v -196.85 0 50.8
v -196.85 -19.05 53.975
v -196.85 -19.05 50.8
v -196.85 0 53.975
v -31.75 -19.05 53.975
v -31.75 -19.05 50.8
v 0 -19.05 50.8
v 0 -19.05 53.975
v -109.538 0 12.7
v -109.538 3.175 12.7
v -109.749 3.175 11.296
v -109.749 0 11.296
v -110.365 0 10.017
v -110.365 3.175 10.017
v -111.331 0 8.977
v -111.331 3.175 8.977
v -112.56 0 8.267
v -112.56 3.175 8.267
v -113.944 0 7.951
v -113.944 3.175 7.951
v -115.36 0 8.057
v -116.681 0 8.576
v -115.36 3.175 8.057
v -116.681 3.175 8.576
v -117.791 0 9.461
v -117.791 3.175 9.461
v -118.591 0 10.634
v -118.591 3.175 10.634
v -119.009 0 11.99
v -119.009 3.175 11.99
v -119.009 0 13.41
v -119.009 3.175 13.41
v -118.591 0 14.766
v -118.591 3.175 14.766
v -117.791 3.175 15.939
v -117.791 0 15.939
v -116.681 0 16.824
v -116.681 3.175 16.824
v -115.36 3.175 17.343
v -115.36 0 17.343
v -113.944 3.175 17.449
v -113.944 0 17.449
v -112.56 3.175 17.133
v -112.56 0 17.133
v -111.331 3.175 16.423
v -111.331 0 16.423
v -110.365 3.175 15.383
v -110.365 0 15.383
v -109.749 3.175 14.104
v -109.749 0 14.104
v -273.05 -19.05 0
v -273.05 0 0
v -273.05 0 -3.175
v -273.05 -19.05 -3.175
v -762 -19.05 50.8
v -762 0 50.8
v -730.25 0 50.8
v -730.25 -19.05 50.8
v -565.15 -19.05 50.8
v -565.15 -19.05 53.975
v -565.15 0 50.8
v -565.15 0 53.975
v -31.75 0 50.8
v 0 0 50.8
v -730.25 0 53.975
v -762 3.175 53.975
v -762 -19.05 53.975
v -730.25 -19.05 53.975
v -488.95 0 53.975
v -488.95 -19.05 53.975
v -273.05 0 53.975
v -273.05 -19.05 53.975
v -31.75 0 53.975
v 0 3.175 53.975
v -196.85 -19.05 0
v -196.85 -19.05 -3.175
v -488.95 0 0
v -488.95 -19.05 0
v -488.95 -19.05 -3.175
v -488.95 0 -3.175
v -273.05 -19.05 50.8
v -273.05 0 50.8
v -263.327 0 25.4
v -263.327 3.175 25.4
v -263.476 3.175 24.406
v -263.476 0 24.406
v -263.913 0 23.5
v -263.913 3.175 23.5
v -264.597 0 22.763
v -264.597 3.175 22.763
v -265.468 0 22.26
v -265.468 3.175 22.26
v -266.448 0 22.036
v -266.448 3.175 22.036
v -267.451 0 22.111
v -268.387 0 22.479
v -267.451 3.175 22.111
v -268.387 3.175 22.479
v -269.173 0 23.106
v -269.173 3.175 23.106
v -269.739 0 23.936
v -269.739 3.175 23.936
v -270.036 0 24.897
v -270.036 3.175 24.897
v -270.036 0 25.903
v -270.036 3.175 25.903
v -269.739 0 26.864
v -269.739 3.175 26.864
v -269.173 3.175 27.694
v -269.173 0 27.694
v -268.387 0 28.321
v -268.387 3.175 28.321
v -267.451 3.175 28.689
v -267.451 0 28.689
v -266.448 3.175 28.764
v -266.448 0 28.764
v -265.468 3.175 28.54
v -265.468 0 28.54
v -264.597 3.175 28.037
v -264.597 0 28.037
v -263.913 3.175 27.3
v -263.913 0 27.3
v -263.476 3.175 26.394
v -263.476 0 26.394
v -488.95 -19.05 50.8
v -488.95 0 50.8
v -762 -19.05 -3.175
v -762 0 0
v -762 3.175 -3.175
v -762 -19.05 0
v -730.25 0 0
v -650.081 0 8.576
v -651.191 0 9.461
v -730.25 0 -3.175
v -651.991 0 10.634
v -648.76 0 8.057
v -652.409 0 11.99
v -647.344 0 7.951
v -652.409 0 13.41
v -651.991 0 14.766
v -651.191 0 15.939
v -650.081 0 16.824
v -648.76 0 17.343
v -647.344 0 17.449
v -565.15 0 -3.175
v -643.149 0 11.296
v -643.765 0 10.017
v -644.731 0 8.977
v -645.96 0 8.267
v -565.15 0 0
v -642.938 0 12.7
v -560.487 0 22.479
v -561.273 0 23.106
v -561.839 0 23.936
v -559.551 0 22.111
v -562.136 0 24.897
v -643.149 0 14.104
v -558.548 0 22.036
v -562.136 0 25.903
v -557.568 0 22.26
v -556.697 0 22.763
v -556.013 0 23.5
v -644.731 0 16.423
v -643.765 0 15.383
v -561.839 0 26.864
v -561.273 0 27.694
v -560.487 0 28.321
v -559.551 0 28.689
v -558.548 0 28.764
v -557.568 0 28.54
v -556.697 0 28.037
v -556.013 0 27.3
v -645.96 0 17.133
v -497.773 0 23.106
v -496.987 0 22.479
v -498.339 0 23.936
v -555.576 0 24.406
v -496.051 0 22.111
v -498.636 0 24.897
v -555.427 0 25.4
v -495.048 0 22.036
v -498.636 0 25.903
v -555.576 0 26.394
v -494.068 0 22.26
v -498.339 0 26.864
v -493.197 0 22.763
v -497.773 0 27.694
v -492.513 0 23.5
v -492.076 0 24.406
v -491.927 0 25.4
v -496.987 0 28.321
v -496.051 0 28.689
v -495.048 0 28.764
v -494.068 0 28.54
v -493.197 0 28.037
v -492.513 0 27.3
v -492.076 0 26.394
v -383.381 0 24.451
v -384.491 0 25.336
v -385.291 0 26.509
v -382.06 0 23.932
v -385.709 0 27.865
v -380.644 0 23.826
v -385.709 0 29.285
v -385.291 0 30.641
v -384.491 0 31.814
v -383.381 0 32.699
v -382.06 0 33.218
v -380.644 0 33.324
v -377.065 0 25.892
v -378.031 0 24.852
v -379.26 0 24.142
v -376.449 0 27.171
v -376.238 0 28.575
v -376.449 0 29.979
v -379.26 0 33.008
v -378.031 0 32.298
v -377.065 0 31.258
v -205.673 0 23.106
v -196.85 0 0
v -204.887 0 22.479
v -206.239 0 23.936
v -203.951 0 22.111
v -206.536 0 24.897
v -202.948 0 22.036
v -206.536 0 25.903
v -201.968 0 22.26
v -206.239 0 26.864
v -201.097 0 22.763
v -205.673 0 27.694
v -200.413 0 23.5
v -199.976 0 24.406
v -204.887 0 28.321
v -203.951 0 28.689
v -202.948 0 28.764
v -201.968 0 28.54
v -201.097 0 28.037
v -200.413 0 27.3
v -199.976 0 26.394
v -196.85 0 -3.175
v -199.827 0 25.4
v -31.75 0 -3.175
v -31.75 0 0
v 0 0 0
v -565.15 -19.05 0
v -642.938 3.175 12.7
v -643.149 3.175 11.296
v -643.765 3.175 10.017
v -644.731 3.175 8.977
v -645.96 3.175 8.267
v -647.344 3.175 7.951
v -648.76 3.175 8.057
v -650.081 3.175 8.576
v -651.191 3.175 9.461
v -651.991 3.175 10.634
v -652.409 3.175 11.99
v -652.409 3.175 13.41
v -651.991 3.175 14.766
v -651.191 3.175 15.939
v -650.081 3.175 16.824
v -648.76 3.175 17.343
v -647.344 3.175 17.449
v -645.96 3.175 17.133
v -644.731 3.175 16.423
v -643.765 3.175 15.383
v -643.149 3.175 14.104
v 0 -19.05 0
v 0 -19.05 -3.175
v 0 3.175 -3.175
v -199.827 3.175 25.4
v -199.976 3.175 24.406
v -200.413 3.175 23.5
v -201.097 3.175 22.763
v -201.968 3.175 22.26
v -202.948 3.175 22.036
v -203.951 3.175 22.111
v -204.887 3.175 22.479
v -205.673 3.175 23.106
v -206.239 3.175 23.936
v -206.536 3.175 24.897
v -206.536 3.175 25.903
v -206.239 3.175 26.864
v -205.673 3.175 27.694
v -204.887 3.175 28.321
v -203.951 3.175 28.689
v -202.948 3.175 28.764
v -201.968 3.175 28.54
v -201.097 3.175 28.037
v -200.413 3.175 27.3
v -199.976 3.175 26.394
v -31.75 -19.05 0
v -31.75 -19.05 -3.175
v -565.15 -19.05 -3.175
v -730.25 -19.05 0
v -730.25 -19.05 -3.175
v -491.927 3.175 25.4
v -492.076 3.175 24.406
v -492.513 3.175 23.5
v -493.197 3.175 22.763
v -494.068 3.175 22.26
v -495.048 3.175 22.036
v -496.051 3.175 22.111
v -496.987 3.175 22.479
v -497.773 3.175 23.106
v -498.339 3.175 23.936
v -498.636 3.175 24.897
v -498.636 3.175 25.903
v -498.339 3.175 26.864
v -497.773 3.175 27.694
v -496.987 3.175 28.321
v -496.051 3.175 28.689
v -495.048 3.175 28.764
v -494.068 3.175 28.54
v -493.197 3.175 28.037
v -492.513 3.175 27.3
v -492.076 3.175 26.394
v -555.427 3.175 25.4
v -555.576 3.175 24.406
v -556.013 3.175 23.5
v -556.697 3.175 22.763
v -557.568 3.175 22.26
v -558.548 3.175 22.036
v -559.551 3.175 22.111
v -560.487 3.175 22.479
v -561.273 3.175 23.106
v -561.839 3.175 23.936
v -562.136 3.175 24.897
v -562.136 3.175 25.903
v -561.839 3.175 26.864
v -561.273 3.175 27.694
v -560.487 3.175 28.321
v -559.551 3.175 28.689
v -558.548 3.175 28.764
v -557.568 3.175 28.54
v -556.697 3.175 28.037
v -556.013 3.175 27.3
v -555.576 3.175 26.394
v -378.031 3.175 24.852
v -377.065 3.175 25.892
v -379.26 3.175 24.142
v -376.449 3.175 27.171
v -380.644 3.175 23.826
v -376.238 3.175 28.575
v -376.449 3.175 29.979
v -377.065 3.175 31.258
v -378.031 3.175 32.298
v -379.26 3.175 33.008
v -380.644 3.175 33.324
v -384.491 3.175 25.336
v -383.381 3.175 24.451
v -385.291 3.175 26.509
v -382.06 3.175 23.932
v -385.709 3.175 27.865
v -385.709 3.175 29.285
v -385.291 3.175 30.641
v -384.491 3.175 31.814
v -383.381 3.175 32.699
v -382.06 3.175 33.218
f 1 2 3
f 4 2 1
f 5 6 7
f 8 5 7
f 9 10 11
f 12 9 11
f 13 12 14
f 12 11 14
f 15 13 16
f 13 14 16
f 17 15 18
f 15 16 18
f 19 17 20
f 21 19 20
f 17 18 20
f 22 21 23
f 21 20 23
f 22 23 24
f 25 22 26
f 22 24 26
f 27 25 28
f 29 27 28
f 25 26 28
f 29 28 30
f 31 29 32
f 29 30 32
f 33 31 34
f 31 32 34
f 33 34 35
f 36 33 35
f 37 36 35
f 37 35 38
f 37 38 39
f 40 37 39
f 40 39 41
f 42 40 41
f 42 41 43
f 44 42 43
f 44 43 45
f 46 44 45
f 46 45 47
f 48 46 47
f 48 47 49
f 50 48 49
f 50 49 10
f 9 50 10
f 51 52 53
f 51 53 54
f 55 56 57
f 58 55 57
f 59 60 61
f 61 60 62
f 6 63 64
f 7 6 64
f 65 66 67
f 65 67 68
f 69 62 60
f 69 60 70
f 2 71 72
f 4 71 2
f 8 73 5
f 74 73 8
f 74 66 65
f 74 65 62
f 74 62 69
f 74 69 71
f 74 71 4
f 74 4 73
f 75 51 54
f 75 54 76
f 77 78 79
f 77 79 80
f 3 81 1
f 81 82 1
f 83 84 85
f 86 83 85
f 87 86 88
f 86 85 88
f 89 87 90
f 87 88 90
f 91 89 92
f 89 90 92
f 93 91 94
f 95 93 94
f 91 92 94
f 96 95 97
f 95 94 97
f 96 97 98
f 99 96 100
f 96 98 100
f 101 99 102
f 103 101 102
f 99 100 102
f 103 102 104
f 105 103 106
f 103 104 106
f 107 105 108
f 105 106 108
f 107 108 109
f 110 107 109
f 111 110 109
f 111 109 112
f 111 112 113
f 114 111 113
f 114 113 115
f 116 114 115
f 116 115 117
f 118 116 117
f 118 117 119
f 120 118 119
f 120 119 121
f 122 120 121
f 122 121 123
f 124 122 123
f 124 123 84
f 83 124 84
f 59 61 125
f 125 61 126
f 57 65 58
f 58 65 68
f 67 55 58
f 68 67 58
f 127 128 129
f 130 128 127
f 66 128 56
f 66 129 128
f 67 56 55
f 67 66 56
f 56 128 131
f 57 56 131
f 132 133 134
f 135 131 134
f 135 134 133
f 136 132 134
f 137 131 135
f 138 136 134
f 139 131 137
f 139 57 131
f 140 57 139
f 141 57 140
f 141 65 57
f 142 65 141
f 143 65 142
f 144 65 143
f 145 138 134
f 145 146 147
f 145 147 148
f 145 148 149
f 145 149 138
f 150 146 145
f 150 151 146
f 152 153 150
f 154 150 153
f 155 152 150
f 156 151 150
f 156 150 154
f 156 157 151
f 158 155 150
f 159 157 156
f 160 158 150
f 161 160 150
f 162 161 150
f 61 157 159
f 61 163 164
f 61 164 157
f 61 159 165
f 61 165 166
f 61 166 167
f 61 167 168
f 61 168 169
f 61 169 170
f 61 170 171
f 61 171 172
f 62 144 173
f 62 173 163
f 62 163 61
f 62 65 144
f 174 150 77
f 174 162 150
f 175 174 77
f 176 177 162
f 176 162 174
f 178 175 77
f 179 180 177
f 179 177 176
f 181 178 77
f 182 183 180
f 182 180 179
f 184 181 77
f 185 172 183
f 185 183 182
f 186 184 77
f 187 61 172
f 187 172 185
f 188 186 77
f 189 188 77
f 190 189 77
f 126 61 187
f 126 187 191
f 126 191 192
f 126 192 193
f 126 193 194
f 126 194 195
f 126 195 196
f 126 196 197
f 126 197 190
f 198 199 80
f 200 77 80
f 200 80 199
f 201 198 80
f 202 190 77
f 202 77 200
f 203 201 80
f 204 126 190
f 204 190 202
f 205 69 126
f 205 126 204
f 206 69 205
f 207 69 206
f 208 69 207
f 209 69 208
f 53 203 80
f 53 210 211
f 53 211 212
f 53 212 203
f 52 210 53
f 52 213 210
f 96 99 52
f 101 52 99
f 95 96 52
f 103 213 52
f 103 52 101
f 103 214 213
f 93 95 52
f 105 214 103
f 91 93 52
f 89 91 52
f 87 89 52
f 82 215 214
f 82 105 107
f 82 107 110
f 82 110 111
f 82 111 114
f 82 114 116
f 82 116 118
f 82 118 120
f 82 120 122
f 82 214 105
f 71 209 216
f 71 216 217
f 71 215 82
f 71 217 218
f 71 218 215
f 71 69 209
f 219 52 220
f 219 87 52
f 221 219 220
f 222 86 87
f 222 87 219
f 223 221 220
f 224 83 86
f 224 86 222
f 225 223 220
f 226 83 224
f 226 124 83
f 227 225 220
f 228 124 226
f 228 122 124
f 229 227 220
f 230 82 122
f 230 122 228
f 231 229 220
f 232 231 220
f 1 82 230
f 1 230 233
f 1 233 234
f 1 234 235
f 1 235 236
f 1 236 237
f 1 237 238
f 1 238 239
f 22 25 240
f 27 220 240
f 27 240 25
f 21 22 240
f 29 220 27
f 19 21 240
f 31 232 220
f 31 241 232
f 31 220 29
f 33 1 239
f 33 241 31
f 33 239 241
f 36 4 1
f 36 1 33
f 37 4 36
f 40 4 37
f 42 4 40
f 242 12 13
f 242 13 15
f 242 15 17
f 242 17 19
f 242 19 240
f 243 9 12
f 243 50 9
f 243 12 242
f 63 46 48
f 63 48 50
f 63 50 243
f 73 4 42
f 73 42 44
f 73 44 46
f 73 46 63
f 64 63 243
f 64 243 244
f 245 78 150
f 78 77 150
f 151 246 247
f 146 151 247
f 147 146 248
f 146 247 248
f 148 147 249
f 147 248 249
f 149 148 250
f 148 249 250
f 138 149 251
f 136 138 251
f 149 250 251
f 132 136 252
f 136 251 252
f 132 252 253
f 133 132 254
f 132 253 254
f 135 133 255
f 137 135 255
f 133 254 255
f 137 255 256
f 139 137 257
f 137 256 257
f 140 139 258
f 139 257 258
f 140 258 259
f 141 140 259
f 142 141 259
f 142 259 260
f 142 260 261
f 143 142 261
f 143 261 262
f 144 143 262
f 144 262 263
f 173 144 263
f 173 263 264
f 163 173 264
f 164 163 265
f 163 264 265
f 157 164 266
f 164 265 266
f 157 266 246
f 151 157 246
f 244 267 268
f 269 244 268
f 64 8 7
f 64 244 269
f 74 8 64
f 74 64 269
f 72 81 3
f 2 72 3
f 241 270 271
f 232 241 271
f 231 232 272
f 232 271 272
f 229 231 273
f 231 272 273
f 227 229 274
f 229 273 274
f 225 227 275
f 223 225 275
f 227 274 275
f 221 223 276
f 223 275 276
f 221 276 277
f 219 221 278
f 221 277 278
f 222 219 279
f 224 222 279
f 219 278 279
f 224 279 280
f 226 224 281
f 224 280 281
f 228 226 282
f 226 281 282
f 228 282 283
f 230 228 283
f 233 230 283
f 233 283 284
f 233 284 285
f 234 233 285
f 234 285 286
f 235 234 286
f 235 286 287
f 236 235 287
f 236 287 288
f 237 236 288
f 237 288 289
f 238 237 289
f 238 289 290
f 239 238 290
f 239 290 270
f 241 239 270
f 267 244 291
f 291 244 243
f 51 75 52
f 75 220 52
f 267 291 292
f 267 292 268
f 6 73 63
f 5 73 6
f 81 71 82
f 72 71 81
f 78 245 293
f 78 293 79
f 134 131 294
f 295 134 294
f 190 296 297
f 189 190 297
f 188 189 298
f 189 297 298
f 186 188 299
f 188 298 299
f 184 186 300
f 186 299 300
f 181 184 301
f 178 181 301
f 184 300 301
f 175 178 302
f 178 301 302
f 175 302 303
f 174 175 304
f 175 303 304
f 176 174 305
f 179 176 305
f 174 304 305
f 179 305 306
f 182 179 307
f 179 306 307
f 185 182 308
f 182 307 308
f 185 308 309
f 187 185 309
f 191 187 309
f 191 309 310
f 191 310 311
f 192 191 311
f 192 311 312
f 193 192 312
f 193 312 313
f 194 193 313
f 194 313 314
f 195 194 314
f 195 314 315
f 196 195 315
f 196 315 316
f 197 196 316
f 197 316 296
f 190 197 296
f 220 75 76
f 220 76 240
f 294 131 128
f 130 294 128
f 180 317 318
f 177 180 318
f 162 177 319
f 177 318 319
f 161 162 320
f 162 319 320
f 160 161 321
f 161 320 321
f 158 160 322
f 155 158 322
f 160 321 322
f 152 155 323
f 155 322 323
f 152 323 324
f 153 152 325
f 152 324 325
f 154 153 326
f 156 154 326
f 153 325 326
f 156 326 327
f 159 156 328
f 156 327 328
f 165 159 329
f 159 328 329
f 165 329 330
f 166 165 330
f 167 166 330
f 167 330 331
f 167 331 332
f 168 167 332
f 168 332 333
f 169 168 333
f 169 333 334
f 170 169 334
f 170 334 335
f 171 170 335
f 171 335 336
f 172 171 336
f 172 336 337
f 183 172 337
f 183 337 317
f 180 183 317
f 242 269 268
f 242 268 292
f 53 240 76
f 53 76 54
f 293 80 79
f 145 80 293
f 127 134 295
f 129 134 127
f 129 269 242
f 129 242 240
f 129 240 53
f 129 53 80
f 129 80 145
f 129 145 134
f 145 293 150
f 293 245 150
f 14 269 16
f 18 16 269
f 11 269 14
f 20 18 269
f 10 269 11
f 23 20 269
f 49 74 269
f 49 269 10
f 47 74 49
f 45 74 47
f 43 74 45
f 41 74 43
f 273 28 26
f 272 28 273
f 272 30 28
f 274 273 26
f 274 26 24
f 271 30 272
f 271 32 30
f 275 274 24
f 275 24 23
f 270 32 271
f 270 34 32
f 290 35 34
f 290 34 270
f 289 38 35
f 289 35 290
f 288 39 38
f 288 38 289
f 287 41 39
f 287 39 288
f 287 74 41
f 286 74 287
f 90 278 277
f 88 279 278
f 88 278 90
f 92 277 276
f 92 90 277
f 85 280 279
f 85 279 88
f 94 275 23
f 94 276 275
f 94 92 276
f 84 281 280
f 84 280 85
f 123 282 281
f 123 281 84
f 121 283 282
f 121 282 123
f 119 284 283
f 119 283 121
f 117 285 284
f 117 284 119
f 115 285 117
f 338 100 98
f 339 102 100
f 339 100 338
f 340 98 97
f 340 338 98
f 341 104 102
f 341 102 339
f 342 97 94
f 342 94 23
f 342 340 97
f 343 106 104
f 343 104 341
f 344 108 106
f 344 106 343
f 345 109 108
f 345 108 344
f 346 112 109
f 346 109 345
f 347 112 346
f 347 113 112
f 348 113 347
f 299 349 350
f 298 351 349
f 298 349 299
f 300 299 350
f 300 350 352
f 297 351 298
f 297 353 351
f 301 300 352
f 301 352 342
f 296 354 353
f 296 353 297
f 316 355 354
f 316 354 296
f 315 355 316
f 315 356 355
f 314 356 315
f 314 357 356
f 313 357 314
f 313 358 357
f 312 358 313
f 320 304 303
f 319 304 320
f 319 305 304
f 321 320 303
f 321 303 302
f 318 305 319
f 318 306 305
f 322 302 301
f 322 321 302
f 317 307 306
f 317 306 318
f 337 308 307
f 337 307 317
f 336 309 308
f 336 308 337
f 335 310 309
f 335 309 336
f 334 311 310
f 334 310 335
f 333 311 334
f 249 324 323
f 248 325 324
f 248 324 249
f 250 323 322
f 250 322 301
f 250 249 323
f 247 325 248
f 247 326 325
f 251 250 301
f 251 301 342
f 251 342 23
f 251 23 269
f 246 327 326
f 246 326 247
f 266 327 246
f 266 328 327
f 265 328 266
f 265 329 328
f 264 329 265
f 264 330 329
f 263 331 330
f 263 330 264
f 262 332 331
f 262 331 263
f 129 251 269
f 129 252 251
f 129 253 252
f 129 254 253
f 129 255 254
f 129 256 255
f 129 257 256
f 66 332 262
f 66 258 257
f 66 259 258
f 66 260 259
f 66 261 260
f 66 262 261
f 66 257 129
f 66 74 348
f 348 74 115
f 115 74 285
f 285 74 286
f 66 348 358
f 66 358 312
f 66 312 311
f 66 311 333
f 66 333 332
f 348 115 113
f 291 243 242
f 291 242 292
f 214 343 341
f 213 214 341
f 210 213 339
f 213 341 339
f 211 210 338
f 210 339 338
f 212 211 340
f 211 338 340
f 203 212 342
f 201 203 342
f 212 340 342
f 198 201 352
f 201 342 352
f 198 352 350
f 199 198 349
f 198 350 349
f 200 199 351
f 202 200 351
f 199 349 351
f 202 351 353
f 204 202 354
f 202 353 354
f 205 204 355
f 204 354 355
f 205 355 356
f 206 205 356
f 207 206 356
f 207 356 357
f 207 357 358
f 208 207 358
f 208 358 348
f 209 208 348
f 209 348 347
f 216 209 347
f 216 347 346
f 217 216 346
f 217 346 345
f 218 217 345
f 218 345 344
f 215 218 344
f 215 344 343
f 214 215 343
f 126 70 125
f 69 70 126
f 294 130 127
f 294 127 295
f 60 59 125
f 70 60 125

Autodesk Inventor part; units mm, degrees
ref_plane "YZ Plane" through (0, 0, 0) normal (1, 0, 0) x (0, 1, 0)
ref_plane "XZ Plane" through (0, 0, 0) normal (0, 1, 0) x (-1, 0, 0)
ref_plane "XY Plane" through (0, 0, 0) normal (0, 0, 1) x (1, 0, 0)
sketch "Sketch1" plane through (0, 0, 0) normal (0, 1, 0) x (-1, 0, 0)
  line L0 (0, 0) -> (762, 0)
  line L1 (762, 0) -> (762, 50.8)
  line L2 (762, 50.8) -> (0, 50.8)
  line L3 (0, 50.8) -> (0, 0)
  dimension "d0" = 762
  dimension "d1" = 50.8
extrude "Extrusion1" add sketch "Sketch1" along normal blind 3.175
sketch "Sketch2" plane through (0, 3.175, 0) normal (0, 1, 0) x (1, 0, 0)
  circle A0 centre (-381, -28.575) radius 4.7625
  line L0 (0, 0) -> (-762, 0) projected
  line L1 (0, -50.8) -> (0, 0) projected
  circle A1 centre (-114.3, -12.7) radius 4.7625
  line L2 (-762, -50.8) -> (0, -50.8) projected
  circle A2 centre (-647.7, -12.7) radius 4.7625
  line L3 (-647.7, 0) -> (-647.7, -50.8) construction
  line L4 (-762, -50.8) -> (0, -50.8) construction
  line L5 (-114.3, -50.8) -> (-114.3, 0) construction
  circle A3 centre (-558.8, -25.4) radius 3.3734
  line L6 (-762, 0) -> (-762, -50.8) projected
  circle A4 centre (-495.3, -25.4) radius 3.3734
  circle A5 centre (-203.2, -25.4) radius 3.3734
  circle A6 centre (-266.7, -25.4) radius 3.3734
  dimension "d4" = 9.525
  dimension "d5" = 28.575
  dimension "d6" = 381
  dimension "d9" = 9.525
  dimension "d10" = 38.1
  dimension "d12" = 9.525
  dimension "d13" = 38.1
  dimension "d31" = 266.7
  dimension "d32" = 266.7
  dimension "d33" = 6.7469
  dimension "d34" = 203.2
  dimension "d35" = 25.4
  dimension "d36" = 6.7469
  dimension "d37" = 25.4
  dimension "d38" = 266.7
  dimension "d39" = 6.7469
  dimension "d40" = 6.7469
  dimension "d41" = 25.4
  dimension "d42" = 25.4
  dimension "d43" = 203.2
  dimension "d44" = 266.7
extrude "Extrusion2" cut sketch "Sketch2" against normal blind 3.175 contours A0 | A1 | A2 | A3 | A4 | A5 | A6
sketch "Sketch3" plane through (-762, 0, 50.8) normal (0, 0, 1) x (1, 0, 0)
  line L0 (762, 3.175) -> (0, 3.175) projected
  line L1 (762, 3.175) -> (0, 3.175)
  line L2 (0, 3.175) -> (0, -19.05)
  line L3 (0, -19.05) -> (762, -19.05)
  line L4 (762, -19.05) -> (762, 3.175)
  point P0 (762, 0)
  dimension "d15" = 762
  dimension "d16" = 22.225
extrude "Extrusion3" add sketch "Sketch3" along normal blind 3.175
sketch "Sketch4" plane through (0, 0, 0) normal (0, 0, -1) x (-1, 0, 0)
  line L0 (0, 3.175) -> (762, 3.175)
  line L1 (762, 3.175) -> (762, -19.05)
  line L2 (762, -19.05) -> (0, -19.05)
  line L3 (0, -19.05) -> (0, 3.175)
  dimension "d19" = 762
  dimension "d20" = 22.225
extrude "Extrusion4" add sketch "Sketch4" along normal blind 3.175
sketch "Sketch5" plane through (-762, 0, 53.975) normal (0, 0, 1) x (1, 0, 0)
  line L0 (762, -19.05) -> (0, -19.05) projected
  line L1 (0, 0) -> (762, 0) projected
  line L2 (730.25, -19.05) -> (565.15, -19.05)
  line L3 (565.15, -19.05) -> (565.15, 0)
  line L4 (565.15, 0) -> (730.25, 0)
  line L5 (730.25, 0) -> (730.25, -19.05)
  line L6 (762, -19.05) -> (762, 3.175) projected
  line L7 (488.95, -19.05) -> (273.05, -19.05)
  line L8 (273.05, -19.05) -> (273.05, 0)
  line L9 (273.05, 0) -> (488.95, 0)
  line L10 (488.95, 0) -> (488.95, -19.05)
  line L11 (31.75, -19.05) -> (196.85, -19.05)
  line L12 (196.85, -19.05) -> (196.85, 0)
  line L13 (196.85, 0) -> (31.75, 0)
  line L14 (31.75, 0) -> (31.75, -19.05)
  line L15 (0, 3.175) -> (0, -19.05) projected
  dimension "d23" = 165.1
  dimension "d24" = 31.75
  dimension "d25" = 215.9
  dimension "d26" = 76.2
  dimension "d27" = 165.1
  dimension "d28" = 31.75
extrude "Extrusion5" cut sketch "Sketch5" against normal blind 57.15 contours L0 L3 L1 L5 | L0 L8 L1 L10 | L0 L14 L1 L12
properties part number "side plate" material "Aluminum 6061"
